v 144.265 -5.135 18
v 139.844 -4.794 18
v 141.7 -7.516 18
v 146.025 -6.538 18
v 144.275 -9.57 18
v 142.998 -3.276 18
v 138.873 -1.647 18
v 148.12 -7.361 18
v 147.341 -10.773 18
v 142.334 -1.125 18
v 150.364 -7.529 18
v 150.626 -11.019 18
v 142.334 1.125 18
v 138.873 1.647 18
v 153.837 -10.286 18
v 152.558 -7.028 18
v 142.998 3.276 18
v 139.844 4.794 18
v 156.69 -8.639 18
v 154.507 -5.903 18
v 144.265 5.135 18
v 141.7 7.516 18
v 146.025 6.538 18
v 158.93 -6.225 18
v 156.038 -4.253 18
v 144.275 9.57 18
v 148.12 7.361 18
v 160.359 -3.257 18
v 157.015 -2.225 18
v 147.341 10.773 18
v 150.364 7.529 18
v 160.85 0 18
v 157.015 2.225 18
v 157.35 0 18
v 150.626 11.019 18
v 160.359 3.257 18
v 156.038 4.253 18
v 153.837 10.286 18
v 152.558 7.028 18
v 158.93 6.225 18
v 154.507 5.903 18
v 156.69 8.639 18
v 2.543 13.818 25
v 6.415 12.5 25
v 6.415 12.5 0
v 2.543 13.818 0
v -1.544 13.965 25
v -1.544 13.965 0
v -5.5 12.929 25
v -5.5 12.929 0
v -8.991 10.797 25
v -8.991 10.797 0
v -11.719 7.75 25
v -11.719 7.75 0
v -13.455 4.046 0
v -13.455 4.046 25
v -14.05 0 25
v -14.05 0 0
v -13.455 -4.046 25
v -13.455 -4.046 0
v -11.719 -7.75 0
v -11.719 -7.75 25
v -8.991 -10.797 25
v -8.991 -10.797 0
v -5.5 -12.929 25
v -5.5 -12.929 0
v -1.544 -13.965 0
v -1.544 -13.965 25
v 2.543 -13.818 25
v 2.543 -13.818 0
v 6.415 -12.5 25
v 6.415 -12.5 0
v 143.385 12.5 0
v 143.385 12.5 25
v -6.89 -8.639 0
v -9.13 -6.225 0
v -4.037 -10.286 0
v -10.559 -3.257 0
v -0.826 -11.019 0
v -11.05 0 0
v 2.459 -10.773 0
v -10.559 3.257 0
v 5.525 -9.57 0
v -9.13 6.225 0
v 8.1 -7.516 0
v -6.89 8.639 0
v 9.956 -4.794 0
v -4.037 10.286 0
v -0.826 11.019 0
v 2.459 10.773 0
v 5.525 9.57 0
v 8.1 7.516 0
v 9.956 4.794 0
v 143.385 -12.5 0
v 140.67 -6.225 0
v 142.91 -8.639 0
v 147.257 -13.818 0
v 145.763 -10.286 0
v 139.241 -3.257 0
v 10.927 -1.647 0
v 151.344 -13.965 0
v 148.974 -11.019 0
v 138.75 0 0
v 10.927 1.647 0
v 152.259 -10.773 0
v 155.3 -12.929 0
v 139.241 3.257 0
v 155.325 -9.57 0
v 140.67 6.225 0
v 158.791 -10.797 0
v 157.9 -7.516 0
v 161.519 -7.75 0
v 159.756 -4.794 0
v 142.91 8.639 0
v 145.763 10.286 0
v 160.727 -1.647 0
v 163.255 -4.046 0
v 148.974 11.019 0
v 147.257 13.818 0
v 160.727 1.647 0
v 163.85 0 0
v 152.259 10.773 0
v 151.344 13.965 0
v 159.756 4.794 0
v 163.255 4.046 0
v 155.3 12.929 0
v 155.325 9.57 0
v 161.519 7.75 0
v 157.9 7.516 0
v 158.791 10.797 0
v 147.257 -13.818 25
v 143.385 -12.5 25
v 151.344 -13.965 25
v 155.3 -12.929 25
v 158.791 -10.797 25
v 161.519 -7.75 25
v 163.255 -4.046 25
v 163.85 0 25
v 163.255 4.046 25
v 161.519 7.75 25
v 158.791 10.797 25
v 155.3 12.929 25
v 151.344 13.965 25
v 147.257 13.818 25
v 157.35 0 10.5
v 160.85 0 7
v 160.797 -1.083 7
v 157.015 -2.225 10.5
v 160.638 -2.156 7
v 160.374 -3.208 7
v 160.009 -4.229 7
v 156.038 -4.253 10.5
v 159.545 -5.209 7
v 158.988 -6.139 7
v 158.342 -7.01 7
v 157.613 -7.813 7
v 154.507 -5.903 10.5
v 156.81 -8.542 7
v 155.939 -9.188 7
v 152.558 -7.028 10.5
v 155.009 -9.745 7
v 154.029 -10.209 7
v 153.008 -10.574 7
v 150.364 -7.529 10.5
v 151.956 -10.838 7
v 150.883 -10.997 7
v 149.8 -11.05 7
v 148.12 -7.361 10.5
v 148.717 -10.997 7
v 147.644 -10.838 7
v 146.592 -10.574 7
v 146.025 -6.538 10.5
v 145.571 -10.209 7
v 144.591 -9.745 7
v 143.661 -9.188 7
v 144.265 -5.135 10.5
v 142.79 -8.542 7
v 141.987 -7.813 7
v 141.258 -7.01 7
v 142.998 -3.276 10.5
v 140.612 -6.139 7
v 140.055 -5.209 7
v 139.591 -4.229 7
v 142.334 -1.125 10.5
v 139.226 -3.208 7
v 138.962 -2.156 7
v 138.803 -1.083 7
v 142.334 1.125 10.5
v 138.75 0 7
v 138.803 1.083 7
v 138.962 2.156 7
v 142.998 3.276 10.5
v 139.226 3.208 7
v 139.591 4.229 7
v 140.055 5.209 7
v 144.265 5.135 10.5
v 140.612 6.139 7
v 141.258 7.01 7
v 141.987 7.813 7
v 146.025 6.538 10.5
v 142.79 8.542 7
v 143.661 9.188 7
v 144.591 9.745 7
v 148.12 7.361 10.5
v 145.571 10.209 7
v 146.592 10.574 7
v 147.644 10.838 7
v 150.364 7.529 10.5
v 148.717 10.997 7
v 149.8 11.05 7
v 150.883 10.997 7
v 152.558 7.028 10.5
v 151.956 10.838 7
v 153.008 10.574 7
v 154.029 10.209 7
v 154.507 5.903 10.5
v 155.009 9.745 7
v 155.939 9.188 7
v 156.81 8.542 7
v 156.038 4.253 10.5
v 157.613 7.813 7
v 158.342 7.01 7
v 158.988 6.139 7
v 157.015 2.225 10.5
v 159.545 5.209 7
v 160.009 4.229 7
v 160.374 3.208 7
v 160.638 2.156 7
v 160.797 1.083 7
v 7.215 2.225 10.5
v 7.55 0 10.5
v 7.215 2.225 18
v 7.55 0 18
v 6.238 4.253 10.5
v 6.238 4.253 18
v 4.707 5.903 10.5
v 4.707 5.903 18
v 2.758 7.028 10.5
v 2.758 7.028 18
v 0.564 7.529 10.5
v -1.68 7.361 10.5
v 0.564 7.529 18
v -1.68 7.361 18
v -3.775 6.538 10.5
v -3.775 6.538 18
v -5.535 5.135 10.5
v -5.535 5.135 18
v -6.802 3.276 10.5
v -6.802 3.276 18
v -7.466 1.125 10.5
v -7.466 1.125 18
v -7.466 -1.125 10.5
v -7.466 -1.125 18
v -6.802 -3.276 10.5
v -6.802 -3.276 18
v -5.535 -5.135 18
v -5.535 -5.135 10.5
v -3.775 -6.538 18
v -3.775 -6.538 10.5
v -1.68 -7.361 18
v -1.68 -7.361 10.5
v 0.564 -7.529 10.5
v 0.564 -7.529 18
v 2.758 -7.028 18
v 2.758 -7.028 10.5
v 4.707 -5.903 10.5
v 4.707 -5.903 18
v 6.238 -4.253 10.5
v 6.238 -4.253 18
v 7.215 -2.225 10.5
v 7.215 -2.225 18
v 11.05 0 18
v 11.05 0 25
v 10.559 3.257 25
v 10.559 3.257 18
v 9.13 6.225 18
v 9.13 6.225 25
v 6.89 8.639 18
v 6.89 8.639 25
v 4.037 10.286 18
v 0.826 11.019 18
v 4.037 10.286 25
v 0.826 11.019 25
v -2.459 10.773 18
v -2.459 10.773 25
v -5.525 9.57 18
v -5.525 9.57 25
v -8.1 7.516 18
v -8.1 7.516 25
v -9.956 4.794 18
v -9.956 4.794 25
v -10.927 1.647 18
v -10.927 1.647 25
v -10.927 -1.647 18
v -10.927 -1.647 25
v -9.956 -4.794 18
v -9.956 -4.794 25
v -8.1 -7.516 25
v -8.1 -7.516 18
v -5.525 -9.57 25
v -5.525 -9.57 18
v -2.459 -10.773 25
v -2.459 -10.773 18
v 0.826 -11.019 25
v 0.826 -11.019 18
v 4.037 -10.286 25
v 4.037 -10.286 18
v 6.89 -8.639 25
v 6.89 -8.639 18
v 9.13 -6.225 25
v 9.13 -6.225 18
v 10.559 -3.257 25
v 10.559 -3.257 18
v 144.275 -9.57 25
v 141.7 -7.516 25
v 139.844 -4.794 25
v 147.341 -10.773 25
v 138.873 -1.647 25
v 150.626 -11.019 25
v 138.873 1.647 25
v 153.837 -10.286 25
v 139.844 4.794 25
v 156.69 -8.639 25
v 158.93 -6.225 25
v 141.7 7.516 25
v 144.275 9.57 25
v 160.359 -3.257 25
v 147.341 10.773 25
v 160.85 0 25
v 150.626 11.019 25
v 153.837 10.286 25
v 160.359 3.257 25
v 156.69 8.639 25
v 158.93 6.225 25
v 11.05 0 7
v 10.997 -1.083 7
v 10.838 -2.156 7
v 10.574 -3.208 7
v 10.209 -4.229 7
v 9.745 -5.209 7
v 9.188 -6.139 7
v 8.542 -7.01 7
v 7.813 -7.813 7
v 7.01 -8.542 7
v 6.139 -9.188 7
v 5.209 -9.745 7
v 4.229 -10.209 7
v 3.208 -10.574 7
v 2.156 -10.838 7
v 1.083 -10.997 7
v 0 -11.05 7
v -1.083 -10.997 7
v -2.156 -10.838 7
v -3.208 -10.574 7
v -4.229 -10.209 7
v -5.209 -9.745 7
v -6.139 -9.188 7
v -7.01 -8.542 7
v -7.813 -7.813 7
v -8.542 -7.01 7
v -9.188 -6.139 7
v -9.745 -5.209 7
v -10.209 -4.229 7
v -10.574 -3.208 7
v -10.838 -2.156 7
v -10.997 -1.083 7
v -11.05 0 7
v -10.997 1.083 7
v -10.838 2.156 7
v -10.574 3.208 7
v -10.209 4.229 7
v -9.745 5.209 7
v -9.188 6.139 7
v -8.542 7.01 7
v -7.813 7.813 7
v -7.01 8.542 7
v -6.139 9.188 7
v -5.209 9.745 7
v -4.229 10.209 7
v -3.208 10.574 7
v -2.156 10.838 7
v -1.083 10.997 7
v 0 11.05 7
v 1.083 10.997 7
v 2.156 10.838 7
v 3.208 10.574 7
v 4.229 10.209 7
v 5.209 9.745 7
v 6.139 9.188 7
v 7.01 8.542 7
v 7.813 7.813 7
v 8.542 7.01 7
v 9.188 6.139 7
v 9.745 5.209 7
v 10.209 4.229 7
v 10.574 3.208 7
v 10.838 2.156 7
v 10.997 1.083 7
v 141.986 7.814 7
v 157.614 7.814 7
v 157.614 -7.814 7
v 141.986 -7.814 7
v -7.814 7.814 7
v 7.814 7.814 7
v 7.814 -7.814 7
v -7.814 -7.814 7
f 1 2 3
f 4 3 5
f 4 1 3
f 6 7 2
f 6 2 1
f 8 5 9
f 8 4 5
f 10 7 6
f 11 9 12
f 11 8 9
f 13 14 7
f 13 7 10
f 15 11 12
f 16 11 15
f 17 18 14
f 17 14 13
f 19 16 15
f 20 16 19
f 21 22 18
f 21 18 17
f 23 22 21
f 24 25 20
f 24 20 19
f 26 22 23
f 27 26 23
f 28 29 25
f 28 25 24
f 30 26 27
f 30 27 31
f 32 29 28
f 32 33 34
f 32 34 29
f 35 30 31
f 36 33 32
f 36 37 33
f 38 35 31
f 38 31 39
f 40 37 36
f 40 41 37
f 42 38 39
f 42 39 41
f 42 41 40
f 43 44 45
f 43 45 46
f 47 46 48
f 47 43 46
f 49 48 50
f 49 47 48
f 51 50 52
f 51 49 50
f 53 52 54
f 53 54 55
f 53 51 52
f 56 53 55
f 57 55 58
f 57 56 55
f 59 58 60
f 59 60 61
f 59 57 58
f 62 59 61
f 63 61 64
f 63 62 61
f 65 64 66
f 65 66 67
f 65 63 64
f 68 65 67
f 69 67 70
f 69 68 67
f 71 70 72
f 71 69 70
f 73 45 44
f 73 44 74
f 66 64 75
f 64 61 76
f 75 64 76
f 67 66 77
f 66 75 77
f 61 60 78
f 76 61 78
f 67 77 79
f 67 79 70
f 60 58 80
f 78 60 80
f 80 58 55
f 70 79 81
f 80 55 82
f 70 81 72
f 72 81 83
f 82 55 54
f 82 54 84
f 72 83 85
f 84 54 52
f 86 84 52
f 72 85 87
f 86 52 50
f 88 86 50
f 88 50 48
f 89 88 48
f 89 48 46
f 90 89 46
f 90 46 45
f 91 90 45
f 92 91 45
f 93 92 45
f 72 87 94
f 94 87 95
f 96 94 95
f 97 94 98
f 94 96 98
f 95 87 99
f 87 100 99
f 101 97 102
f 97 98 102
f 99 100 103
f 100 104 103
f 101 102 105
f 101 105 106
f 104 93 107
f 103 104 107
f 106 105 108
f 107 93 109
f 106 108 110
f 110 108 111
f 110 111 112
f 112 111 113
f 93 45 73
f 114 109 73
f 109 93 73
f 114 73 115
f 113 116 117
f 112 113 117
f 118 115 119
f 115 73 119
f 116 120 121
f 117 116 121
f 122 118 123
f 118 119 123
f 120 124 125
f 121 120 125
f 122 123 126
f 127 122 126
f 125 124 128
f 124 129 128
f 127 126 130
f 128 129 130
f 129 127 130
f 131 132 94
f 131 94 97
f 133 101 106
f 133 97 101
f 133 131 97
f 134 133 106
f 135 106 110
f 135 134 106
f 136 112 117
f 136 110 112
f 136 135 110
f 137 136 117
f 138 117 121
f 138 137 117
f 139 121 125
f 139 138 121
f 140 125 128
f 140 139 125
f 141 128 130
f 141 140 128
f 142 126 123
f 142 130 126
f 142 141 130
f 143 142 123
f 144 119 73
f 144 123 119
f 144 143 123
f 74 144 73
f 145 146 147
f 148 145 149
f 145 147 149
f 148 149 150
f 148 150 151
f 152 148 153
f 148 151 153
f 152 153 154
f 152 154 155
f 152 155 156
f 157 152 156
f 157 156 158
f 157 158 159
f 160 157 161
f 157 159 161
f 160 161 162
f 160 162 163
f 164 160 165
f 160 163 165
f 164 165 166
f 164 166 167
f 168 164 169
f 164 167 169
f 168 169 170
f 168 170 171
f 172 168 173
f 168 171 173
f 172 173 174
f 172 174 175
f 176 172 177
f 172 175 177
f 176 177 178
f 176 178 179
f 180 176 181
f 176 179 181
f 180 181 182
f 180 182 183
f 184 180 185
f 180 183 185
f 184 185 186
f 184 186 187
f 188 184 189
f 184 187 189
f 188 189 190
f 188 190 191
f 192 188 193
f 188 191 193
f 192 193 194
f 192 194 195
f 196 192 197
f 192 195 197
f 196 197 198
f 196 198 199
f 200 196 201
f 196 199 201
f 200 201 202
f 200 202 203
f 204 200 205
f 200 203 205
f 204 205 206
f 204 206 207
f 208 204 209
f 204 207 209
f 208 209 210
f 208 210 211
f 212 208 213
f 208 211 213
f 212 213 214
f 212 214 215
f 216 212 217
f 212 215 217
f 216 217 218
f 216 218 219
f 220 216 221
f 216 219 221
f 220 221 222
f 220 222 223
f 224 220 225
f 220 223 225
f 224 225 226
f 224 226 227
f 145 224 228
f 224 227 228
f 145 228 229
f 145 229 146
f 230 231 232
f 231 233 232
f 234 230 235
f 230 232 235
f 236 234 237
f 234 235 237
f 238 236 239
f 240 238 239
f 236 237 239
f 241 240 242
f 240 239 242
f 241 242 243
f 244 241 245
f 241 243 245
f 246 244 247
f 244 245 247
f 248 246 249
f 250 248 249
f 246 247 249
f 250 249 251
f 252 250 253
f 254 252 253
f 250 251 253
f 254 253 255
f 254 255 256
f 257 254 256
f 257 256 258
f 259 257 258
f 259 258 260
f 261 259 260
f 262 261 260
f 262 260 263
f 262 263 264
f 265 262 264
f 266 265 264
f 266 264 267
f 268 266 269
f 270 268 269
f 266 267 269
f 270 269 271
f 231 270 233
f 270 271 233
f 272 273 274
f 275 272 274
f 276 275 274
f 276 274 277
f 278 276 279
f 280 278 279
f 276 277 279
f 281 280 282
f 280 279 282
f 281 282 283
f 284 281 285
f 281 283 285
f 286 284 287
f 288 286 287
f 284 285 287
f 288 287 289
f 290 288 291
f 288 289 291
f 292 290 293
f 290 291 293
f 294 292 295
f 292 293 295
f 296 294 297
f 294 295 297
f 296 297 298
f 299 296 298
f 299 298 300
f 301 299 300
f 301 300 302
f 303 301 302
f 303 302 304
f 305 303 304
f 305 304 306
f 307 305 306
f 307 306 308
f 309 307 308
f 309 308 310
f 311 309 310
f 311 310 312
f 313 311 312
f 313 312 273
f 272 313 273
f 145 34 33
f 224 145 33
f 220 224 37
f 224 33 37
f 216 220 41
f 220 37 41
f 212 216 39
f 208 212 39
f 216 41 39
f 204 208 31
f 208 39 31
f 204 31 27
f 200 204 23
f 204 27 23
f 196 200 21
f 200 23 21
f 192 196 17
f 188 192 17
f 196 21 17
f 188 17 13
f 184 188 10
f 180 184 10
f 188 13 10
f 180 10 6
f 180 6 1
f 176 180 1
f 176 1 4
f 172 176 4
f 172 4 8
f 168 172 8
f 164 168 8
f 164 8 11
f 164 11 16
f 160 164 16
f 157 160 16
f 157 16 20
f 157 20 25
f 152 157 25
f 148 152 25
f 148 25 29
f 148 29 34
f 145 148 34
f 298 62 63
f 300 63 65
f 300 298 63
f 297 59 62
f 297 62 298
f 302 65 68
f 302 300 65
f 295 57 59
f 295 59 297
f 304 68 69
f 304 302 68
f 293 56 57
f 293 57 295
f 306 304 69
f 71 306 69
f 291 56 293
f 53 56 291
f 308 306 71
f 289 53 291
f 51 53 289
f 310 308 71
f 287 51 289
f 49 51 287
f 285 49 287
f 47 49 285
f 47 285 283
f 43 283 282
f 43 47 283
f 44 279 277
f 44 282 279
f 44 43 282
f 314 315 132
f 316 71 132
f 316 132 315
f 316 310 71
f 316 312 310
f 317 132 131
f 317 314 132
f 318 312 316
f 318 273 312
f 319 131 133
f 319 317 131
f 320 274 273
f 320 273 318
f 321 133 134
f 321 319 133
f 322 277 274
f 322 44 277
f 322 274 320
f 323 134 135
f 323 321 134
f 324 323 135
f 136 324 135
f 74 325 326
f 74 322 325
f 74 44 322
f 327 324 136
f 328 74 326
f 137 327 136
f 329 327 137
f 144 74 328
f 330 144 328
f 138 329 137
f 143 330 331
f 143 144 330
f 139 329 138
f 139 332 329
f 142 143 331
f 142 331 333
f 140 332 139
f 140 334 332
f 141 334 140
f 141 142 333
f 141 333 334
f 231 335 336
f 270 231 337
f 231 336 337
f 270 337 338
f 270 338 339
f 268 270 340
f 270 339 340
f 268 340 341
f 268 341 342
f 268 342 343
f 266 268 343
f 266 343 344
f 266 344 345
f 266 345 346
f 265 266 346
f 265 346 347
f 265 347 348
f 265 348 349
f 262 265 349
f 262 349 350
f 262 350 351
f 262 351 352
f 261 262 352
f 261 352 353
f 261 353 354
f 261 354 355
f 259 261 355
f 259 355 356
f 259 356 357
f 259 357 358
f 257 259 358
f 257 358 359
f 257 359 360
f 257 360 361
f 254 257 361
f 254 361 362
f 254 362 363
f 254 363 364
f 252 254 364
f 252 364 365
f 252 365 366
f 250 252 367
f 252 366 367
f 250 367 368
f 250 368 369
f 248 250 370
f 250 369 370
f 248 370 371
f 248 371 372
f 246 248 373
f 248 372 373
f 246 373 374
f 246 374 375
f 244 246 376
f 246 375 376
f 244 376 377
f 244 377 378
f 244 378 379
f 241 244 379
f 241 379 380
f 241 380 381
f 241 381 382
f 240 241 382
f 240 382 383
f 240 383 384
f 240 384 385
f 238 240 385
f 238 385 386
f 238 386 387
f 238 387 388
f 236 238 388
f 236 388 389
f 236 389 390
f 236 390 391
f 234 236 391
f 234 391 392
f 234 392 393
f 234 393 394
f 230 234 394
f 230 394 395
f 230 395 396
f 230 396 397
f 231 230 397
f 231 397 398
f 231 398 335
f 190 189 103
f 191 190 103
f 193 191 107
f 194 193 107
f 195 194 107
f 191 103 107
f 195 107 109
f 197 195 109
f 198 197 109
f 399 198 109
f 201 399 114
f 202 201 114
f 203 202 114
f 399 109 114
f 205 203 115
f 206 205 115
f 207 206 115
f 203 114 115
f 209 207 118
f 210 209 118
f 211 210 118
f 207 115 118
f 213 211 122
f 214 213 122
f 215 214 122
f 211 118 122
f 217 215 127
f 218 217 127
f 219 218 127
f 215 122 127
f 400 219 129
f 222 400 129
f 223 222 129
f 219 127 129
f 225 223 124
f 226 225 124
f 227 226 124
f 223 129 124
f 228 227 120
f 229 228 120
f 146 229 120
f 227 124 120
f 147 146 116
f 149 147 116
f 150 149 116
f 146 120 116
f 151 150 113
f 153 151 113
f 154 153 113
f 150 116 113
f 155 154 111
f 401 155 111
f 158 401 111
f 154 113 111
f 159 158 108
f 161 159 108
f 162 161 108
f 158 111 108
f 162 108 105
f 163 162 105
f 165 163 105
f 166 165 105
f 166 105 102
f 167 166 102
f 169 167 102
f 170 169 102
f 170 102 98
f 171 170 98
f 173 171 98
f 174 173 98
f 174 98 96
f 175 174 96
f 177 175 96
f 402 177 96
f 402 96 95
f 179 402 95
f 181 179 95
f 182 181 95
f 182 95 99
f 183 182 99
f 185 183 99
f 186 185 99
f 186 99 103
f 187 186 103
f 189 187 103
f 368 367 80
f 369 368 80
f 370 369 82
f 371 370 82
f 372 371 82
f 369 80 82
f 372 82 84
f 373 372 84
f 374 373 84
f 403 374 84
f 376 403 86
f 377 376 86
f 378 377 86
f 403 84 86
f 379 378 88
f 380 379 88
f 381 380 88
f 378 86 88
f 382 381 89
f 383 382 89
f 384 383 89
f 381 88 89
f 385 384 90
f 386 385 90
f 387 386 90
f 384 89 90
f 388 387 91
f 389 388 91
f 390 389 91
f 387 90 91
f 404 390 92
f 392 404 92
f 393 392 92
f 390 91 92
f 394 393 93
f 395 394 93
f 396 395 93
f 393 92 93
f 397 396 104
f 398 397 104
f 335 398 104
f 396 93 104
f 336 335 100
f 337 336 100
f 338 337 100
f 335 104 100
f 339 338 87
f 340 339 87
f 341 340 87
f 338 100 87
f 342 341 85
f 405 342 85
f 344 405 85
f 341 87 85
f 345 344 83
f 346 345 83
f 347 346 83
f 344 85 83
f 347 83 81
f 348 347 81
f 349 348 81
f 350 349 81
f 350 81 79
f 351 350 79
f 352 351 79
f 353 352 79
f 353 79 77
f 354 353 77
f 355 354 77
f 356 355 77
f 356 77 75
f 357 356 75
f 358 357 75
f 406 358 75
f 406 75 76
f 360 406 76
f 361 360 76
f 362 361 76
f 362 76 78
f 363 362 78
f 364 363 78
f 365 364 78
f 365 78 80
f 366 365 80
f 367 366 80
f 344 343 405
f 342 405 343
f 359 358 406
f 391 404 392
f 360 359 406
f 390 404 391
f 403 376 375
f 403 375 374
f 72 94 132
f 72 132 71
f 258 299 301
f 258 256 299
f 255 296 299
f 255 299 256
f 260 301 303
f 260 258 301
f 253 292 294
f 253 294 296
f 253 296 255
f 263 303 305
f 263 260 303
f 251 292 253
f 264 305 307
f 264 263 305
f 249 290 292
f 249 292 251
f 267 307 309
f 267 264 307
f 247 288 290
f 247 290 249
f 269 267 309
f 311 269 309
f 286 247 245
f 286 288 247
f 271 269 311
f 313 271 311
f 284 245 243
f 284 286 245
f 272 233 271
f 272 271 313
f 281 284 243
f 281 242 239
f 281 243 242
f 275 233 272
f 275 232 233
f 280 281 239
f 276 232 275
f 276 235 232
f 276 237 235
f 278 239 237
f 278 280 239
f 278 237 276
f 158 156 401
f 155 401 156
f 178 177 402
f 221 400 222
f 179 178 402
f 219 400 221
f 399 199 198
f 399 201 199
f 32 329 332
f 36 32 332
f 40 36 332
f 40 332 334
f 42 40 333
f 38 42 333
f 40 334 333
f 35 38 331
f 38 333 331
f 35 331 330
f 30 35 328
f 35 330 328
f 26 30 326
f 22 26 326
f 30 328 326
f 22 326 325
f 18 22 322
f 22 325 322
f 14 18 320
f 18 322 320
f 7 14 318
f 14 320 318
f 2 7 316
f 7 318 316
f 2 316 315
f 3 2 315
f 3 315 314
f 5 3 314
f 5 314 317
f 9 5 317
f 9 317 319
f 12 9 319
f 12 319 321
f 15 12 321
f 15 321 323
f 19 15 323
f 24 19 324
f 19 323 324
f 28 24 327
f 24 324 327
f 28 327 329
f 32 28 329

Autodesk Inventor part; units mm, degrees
ref_plane "YZ Plane" through (0, 0, 0) normal (1, 0, 0) x (0, 1, 0)
ref_plane "XZ Plane" through (0, 0, 0) normal (0, 1, 0) x (-1, 0, 0)
ref_plane "XY Plane" through (0, 0, 0) normal (0, 0, 1) x (1, 0, 0)
sketch "Sketch1" plane through (0, 0, 0) normal (0, 0, 1) x (1, 0, 0)
  line L0 (0, 12.5) -> (149.8, 12.5)
  arc A0 (149.8, -12.5) -> (149.8, 12.5) centre (149.8, 0) ccw
  line L1 (149.8, -12.5) -> (0, -12.5)
  arc A1 (0, 12.5) -> (0, -12.5) centre (0, 0) ccw
  dimension "d0" = 149.8
  dimension "d2" = 12.5
extrude "Extrusion1" add sketch "Sketch1" along normal blind 25
sketch "Sketch2" plane through (0, 0, 25) normal (0, 0, 1) x (1, 0, 0)
  arc A0 (0, 12.5) -> (0, -12.5) centre (0, 0) ccw projected
  arc A1 (149.8, -12.5) -> (149.8, 12.5) centre (149.8, 0) ccw projected
  circle A2 centre (0, 0) radius 7.55
  circle A3 centre (149.8, 0) radius 7.55
  dimension "d5" = 15.1
extrude "Extrusion2" cut sketch "Sketch2" against normal through all
sketch "Sketch3" plane through (0, 0, 25) normal (0, 0, 1) x (1, 0, 0)
  circle A0 centre (0, 0) radius 7.55 projected
  circle A1 centre (149.8, 0) radius 7.55 projected
  arc A2 (0, 12.5) -> (0, -12.5) centre (0, 0) ccw projected
  arc A3 (149.8, -12.5) -> (149.8, 12.5) centre (149.8, 0) ccw projected
  circle A4 centre (0, 0) radius 11.05
  circle A5 centre (149.8, 0) radius 11.05
  dimension "d9" = 22.1
extrude "Extrusion3" cut sketch "Sketch3" against normal blind 7
sketch "Sketch4" plane through (0, 0, 0) normal (0, 0, -1) x (-1, 0, 0)
  circle A0 centre (0, 0) radius 7.55 projected
  circle A1 centre (-149.8, 0) radius 7.55 projected
  circle A2 centre (-149.8, 0) radius 11.05 projected
  circle A3 centre (0, 0) radius 11.05 projected
extrude "Extrusion4" cut sketch "Sketch4" against normal blind 7
chamfer "Chamfer1" distance 3.5 angle 45 2 edges at (142.25, 0, 7) (-7.55, 0, 7)
sketch "Sketch5" plane through (0, 0, 25) normal (0, 0, 1) x (1, 0, 0)
  circle A0 centre (0, 0) radius 11.05 projected
  circle A1 centre (149.8, 0) radius 11.05 projected
  arc A2 (0, 12.5) -> (0, -12.5) centre (0, 0) ccw projected
  arc A3 (149.8, -12.5) -> (149.8, 12.5) centre (149.8, 0) ccw projected
  circle A4 centre (0, 0) radius 14.05
  circle A5 centre (149.8, 0) radius 14.05
  dimension "d18" = 3
extrude "Extrusion5" add sketch "Sketch5" against normal up to surface (25 mm away)
ref_plane "Work Plane2" through (6.8813, -12.5, 23) normal (0, -1, 0) x (1, 0, 0)
sketch "Sketch6" plane through (6.415, -12.5, 0) normal (0, -1, 0) x (1, 0, 0)
  line L0 (0, 0) -> (136.97, 2.0217)
  line L1 (136.97, 2.0217) -> (131.3954, 22.9783)
  line L2 (0, 25) -> (136.97, 25) construction
  line L3 (136.97, 25) -> (136.97, 0) construction
  line L4 (136.97, 0) -> (0, 0) construction
  line L5 (0, 0) -> (0, 25) construction
  line L6 (136.97, 0) -> (136.97, 25) projected
  line L7 (0, 25) -> (136.97, 25) projected
  point P0 (-6.8813, -23)
  point P1 (136.97, 12.5)
  point P2 (134.1827, 12.5)
  point P3 (68.485, 25)
  point P4 (68.485, 1.0109)
ref_plane "Work Plane1" through (6.8813, 12.5, 23) normal (0, 1, 0) x (1, 0, 0)
sketch "Sketch7" plane through (6.8813, 12.5, 23) normal (0, 1, 0) x (1, 0, 0)
  line L0 (136.5037, 23) -> (-0.4663, 23) construction
  line L1 (-0.4663, 23) -> (-0.4663, -2) construction
  line L2 (-0.4663, -2) -> (136.5037, -2) construction
  line L3 (136.5037, -2) -> (136.5037, 23) construction
  line L4 (136.5037, -2) -> (136.5037, 23) projected
  line L5 (-0.4663, 23) -> (136.5037, 23) projected
  line L6 (-0.4663, 23) -> (-0.4663, -2) projected
  line L7 (136.5037, -2) -> (-0.4663, -2) projected
  point P0 (-6.8813, 23)
extrude "Extrusion6" [suppressed]
extrude "Extrusion7" [suppressed]
properties part number "xy wall arm SP"
